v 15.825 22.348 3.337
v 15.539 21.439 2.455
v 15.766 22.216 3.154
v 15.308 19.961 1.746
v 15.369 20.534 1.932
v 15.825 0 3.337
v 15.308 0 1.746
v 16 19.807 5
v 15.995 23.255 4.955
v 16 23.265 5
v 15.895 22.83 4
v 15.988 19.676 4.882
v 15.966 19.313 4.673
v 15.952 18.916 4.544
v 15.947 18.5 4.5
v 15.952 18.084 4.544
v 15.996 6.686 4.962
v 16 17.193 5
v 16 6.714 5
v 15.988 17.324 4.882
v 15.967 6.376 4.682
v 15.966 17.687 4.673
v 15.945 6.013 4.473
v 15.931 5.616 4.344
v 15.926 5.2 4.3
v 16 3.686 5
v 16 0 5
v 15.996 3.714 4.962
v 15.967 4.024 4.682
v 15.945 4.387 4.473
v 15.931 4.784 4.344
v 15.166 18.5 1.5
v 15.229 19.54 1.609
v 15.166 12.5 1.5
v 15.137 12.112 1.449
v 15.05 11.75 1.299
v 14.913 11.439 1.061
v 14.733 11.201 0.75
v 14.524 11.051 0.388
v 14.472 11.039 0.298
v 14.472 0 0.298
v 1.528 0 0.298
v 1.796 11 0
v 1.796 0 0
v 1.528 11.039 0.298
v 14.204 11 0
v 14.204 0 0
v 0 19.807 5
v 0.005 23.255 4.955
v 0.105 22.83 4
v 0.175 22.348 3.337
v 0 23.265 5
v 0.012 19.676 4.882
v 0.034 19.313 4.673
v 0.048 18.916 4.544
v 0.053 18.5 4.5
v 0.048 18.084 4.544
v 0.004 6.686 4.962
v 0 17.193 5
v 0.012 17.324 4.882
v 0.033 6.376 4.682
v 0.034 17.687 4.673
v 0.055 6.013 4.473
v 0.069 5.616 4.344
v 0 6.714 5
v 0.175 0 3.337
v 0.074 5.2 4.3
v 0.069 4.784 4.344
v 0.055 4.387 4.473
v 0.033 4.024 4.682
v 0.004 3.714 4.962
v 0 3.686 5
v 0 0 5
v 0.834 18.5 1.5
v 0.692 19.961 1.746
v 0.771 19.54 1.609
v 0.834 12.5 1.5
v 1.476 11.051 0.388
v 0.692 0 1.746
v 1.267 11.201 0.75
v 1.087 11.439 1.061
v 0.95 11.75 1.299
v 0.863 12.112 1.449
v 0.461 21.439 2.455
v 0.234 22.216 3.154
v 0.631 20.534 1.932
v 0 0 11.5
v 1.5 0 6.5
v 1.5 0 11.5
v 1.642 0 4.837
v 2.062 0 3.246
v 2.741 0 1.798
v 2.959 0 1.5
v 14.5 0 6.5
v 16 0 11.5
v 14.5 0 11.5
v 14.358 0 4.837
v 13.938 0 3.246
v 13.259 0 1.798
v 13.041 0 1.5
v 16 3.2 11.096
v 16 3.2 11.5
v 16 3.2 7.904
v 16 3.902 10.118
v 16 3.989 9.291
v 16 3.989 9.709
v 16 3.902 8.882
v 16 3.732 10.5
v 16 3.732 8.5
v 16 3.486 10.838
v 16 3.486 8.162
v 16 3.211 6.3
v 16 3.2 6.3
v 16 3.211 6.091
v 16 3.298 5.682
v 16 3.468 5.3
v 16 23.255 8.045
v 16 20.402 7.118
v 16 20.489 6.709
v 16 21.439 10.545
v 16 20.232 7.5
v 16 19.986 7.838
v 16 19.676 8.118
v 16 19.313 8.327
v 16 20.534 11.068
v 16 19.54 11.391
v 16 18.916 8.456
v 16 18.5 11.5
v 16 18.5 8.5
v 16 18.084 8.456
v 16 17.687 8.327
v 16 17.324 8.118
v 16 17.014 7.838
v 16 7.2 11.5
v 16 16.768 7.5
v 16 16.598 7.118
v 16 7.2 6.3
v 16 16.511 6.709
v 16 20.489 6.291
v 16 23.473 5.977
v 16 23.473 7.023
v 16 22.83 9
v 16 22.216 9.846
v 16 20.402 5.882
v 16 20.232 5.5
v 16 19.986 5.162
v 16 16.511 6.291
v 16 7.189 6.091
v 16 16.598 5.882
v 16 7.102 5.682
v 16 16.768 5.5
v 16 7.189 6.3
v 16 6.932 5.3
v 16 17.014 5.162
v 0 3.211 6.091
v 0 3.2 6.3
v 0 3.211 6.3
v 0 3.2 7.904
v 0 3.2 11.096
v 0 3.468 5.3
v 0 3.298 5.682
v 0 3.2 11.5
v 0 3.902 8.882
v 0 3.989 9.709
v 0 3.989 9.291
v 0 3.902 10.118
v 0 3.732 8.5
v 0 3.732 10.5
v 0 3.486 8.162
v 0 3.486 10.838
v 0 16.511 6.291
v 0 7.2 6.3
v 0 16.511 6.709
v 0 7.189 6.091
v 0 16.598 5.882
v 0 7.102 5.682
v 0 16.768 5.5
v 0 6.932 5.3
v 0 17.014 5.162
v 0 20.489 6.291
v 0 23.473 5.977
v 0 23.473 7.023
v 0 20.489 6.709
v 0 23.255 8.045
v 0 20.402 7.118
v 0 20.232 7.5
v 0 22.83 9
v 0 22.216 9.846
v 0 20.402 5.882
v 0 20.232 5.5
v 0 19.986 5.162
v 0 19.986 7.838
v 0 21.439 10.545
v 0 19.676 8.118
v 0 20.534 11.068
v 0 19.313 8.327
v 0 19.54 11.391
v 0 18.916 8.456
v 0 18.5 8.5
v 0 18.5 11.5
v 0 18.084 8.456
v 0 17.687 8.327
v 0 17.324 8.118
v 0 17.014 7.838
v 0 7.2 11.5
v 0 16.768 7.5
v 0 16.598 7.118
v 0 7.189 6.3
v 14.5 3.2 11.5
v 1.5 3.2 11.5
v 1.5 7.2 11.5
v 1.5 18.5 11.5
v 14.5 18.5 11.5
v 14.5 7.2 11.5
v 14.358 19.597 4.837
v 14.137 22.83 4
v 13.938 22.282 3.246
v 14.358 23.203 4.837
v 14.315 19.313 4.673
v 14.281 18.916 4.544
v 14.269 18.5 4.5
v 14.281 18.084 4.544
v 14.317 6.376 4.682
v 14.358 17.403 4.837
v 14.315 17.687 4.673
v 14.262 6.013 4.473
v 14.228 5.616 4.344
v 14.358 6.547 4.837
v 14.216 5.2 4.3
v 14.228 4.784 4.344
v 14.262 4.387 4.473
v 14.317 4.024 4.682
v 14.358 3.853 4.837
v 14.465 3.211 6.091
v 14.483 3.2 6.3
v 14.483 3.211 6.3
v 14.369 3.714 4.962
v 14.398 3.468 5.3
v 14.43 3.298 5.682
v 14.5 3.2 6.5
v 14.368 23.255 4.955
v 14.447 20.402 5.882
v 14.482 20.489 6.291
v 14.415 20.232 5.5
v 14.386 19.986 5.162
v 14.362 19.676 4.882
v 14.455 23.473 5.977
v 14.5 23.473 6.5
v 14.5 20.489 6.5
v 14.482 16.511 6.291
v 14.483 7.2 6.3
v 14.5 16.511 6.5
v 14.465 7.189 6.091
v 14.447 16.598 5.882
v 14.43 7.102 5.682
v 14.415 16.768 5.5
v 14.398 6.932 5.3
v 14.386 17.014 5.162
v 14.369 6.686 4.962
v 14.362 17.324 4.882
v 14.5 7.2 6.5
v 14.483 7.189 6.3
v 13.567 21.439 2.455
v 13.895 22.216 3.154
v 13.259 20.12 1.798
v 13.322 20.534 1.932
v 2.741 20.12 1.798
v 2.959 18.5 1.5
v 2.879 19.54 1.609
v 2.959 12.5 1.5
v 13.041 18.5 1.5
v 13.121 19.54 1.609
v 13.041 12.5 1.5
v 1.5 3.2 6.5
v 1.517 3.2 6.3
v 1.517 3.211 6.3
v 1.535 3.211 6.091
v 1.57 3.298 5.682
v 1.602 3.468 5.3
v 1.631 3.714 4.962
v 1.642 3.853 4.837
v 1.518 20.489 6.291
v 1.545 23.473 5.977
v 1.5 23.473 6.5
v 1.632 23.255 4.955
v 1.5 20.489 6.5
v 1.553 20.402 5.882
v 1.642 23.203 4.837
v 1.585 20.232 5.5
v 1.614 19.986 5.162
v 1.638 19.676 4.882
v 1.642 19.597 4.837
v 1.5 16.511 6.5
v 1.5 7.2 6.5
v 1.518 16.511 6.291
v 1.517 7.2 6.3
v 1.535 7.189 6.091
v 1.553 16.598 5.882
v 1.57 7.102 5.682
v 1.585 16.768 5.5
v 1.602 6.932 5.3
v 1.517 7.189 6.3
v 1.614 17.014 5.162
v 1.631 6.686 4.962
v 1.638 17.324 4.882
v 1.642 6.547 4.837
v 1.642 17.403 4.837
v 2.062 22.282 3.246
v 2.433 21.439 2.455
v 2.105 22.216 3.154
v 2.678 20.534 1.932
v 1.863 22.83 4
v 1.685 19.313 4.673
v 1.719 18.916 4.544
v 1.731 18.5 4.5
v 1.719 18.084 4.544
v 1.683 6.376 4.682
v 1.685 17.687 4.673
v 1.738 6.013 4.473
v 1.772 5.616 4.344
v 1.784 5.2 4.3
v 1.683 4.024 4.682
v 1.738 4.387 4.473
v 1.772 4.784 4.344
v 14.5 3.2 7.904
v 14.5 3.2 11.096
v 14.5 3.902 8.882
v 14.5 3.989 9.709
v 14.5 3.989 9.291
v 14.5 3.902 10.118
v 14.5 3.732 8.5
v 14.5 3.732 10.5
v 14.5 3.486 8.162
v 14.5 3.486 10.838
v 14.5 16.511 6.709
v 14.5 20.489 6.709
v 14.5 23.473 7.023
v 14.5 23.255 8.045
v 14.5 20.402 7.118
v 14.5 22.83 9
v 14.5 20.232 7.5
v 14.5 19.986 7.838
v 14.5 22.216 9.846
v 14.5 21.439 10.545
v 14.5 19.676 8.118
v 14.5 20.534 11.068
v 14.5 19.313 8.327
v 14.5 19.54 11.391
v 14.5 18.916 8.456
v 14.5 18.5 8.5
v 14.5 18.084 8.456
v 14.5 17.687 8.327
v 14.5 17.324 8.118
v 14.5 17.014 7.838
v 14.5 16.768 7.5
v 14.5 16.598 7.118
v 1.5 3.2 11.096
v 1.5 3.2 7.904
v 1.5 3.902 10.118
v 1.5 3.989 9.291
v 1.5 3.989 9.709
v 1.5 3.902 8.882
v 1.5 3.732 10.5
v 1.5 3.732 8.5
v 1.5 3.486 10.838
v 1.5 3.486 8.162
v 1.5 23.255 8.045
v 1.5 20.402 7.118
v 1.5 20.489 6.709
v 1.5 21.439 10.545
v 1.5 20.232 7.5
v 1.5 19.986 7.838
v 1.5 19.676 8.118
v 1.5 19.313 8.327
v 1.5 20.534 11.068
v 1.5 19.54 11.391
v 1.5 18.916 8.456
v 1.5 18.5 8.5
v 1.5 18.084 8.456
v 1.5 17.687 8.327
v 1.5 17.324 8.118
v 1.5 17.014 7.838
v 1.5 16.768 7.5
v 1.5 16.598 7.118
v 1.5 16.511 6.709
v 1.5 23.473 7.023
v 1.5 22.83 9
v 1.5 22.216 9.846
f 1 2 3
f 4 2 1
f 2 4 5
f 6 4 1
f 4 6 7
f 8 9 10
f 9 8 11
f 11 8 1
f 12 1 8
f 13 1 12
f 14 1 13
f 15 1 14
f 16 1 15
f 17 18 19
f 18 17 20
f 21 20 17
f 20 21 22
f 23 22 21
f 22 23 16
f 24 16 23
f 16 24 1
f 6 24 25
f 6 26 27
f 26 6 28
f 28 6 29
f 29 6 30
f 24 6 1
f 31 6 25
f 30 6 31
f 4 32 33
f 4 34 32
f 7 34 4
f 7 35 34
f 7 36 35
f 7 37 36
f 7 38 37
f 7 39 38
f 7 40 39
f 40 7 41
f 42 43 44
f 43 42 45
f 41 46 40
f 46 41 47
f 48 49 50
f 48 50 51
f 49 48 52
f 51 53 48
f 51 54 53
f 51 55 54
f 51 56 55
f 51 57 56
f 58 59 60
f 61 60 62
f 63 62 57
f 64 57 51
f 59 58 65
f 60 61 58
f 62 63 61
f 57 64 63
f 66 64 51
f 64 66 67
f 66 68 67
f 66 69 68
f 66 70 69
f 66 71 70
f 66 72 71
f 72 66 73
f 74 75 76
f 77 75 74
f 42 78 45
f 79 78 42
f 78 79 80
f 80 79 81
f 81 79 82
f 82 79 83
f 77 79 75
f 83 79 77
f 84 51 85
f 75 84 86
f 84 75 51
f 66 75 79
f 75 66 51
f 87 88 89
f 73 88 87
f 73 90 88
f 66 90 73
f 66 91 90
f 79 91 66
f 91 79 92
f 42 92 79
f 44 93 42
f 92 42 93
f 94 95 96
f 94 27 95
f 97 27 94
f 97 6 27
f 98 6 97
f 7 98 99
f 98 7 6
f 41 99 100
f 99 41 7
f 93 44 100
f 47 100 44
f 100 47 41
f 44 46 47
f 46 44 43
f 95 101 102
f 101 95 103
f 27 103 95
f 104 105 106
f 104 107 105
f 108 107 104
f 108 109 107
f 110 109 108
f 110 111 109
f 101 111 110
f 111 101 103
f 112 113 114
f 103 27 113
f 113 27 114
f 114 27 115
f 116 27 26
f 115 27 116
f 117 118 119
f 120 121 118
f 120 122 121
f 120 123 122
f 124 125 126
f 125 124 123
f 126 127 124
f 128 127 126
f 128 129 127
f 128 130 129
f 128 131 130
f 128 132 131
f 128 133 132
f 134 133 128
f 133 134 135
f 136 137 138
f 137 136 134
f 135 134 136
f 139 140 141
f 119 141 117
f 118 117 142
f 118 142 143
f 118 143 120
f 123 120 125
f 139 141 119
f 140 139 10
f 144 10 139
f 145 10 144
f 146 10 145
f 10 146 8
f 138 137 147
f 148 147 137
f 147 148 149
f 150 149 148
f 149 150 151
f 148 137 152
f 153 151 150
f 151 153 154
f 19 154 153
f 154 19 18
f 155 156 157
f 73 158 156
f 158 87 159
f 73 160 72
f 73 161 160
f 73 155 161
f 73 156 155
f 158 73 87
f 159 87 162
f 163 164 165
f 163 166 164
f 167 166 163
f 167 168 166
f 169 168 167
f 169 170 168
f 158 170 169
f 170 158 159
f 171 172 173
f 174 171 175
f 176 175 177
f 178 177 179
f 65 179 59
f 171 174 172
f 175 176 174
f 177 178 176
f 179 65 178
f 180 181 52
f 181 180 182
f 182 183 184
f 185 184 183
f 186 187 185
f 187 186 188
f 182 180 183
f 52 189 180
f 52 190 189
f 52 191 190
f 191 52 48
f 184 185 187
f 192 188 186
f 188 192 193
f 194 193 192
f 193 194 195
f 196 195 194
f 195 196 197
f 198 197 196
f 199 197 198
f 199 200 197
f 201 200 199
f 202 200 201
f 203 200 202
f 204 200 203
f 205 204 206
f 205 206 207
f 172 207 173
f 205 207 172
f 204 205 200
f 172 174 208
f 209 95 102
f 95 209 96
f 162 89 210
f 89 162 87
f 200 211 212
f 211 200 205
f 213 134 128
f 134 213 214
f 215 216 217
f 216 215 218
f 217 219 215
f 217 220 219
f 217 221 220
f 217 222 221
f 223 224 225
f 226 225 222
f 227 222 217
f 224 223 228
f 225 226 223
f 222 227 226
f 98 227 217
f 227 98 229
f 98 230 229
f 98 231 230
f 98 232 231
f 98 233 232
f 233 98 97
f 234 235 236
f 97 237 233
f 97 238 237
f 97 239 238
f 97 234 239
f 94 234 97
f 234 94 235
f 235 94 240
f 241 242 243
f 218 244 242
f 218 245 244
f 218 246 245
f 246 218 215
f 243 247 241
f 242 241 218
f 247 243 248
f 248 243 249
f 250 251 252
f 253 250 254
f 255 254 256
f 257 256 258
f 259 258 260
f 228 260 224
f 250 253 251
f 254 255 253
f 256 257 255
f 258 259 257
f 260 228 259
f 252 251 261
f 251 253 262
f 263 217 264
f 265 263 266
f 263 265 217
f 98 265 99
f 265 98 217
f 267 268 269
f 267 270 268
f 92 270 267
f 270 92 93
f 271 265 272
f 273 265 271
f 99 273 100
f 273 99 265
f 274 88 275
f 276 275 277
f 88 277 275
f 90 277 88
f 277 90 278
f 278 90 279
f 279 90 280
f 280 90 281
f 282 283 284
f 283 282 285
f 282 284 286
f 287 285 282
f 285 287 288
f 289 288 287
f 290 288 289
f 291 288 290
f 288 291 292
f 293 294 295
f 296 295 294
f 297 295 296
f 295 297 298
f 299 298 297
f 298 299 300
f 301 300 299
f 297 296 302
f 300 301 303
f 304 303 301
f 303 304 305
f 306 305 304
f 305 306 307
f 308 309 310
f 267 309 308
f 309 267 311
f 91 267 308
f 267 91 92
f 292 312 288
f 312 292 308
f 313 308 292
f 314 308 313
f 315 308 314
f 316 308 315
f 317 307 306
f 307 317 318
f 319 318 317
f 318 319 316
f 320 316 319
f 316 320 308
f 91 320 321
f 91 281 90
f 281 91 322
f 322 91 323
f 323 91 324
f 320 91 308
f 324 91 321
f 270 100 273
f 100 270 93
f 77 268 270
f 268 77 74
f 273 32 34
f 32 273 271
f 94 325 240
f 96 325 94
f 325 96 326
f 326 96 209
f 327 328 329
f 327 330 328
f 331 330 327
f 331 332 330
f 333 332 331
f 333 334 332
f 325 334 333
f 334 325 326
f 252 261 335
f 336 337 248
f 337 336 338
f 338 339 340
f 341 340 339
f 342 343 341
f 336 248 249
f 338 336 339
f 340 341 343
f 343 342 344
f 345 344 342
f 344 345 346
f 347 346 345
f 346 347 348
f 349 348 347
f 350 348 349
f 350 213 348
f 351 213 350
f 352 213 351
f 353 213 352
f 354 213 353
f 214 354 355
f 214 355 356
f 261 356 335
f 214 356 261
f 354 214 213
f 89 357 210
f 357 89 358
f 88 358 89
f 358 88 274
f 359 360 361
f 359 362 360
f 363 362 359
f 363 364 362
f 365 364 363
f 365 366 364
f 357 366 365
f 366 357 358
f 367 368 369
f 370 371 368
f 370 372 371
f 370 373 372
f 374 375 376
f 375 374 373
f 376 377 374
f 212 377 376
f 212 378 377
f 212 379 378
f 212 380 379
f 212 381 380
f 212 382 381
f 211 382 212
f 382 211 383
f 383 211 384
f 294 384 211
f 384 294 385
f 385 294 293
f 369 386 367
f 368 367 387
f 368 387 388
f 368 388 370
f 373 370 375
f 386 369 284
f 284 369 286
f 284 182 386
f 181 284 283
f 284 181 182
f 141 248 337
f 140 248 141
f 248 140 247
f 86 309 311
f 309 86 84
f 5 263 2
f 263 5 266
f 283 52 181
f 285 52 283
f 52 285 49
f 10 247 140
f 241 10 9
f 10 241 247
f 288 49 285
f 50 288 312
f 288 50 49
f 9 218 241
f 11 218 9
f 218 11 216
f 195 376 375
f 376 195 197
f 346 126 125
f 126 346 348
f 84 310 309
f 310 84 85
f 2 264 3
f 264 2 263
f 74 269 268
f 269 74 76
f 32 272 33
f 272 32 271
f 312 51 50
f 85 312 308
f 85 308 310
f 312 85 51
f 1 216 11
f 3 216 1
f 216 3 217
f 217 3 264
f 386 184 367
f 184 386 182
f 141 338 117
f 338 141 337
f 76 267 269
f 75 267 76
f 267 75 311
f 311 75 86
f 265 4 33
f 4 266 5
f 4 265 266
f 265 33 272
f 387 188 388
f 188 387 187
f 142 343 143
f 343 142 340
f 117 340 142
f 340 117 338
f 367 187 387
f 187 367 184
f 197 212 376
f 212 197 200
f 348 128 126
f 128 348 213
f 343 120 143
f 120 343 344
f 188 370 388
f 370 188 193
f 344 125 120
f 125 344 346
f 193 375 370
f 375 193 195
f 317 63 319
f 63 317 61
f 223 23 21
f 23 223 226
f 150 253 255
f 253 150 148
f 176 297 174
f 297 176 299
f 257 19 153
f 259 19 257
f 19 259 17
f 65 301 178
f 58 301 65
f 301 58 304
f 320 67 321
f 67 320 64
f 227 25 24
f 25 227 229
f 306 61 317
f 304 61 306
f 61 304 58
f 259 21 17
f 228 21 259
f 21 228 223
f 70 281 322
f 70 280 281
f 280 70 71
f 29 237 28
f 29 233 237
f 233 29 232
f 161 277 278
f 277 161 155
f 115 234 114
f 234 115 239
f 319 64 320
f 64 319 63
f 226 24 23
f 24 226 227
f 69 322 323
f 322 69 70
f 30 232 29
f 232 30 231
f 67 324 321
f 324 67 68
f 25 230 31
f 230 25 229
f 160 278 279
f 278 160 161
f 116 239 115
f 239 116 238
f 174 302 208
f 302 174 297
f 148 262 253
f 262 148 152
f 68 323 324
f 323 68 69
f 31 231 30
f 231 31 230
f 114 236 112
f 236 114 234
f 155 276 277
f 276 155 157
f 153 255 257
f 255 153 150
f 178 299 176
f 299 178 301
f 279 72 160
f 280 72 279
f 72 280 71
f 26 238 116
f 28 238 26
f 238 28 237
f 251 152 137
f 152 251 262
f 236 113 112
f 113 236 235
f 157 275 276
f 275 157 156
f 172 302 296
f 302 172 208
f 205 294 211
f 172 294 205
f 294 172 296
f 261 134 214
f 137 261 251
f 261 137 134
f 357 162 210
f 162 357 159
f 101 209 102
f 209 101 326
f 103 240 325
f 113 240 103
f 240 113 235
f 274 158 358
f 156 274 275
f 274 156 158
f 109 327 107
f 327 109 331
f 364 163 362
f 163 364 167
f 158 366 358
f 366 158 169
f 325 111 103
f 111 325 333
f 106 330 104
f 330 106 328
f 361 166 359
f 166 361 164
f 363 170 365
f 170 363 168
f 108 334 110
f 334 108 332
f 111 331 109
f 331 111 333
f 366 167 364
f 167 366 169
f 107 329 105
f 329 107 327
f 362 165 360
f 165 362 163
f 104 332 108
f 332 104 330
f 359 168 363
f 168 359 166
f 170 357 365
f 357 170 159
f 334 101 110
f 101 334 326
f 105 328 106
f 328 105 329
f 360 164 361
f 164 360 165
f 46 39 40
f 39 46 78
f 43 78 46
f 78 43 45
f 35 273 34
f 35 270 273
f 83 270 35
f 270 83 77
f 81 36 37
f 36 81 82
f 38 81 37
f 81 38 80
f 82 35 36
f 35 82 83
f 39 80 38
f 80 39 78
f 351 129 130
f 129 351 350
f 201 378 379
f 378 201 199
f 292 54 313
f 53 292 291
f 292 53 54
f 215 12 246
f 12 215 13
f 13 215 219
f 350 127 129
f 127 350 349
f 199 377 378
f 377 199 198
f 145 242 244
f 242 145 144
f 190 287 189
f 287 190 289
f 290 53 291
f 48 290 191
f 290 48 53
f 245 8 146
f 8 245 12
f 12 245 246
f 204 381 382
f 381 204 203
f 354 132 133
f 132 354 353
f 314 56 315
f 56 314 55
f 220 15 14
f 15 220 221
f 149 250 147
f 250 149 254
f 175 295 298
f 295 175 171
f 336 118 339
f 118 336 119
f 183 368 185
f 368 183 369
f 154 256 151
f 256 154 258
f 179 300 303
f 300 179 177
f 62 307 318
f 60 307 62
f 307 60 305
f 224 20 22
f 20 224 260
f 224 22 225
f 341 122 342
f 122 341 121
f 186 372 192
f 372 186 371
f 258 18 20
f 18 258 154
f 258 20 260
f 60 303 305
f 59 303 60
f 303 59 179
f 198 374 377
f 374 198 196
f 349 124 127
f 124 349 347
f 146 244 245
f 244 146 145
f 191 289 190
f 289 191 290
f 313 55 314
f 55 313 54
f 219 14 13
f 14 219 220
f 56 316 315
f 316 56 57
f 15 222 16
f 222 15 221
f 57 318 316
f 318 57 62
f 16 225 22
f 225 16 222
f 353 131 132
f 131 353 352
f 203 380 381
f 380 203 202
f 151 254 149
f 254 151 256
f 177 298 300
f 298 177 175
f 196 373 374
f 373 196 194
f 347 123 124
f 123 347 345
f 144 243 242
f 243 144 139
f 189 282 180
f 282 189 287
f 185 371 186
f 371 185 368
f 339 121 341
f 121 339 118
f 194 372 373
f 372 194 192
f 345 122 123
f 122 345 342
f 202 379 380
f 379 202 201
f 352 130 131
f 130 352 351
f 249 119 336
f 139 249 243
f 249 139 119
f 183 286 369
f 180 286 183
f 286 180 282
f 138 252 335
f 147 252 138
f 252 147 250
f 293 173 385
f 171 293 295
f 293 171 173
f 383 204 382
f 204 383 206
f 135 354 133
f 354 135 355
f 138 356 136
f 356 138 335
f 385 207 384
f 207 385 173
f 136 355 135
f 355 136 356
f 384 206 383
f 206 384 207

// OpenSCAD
use <MCAD/boxes.scad>
// $fa=1;
$fs=0.4;

width=16;
height=11.5;
length=23.5;

top_radius=8;
side_straight_height=6.5;
thickness=1.5;

rounded_section_length=11;
rounded_section_radius=5;
rounded_section_hole_radius=2;

clip_hole_offset=5.2;
clip_hole_radius=2;
clip_bump_radius=2;
clip_bump_size=0.8;

module volume() {
    cube([width, side_straight_height, length]);
    difference() {
        translate([top_radius, side_straight_height])
            cylinder(r=top_radius, h=length, center=false);
        translate([0, height])
            cube([width, height, length]);
    }

}

module outline() {
    translate([0, 0, height])
        rotate([-90, 0, 0])
        difference() {
            volume();
            translate([thickness, -thickness, 0])
                scale([1 - 2*thickness/width, 1, 1])
                volume();
        }
}

difference() {
    outline();
    // Straight edge of rounded section
    translate([0, length - rounded_section_length])
        cube([width, rounded_section_length, height - 2*rounded_section_radius]);
    translate([0, length - rounded_section_length, 0])
        rotate([0, 90, 0])
        cylinder(r=height - 2*rounded_section_radius, h=width, center=false);
    // Round the end of rounded section
    difference() {
        translate([0, length - rounded_section_radius, 0])
            cube([width, rounded_section_radius, height]);
        translate([0, length - rounded_section_radius, height - rounded_section_radius])
            rotate([0, 90, 0])
            cylinder(r=rounded_section_radius, h=width, center=false);
    }
    // Hole in rounded section
    translate([0, length - rounded_section_radius, height - rounded_section_radius])
        rotate([0, 90, 0])
        cylinder(r=rounded_section_hole_radius, h=width, center=false);
    // Hole for clip
    difference() {
        union() {
            translate([0, clip_hole_offset, height - clip_hole_offset])
                rotate([0, 90, 0])
                cylinder(r=clip_hole_radius, h=width, center=false);
            translate([0, clip_hole_offset - clip_hole_radius, height - clip_hole_offset])
                cube([width, clip_hole_radius*2, clip_hole_offset]);
        }
        translate([0, clip_hole_offset - clip_hole_radius - clip_bump_radius + clip_bump_size, height - clip_bump_radius])
            rotate([0, 90, 0])
            cylinder(r=clip_bump_radius, h=width, center=false);
    }
}
